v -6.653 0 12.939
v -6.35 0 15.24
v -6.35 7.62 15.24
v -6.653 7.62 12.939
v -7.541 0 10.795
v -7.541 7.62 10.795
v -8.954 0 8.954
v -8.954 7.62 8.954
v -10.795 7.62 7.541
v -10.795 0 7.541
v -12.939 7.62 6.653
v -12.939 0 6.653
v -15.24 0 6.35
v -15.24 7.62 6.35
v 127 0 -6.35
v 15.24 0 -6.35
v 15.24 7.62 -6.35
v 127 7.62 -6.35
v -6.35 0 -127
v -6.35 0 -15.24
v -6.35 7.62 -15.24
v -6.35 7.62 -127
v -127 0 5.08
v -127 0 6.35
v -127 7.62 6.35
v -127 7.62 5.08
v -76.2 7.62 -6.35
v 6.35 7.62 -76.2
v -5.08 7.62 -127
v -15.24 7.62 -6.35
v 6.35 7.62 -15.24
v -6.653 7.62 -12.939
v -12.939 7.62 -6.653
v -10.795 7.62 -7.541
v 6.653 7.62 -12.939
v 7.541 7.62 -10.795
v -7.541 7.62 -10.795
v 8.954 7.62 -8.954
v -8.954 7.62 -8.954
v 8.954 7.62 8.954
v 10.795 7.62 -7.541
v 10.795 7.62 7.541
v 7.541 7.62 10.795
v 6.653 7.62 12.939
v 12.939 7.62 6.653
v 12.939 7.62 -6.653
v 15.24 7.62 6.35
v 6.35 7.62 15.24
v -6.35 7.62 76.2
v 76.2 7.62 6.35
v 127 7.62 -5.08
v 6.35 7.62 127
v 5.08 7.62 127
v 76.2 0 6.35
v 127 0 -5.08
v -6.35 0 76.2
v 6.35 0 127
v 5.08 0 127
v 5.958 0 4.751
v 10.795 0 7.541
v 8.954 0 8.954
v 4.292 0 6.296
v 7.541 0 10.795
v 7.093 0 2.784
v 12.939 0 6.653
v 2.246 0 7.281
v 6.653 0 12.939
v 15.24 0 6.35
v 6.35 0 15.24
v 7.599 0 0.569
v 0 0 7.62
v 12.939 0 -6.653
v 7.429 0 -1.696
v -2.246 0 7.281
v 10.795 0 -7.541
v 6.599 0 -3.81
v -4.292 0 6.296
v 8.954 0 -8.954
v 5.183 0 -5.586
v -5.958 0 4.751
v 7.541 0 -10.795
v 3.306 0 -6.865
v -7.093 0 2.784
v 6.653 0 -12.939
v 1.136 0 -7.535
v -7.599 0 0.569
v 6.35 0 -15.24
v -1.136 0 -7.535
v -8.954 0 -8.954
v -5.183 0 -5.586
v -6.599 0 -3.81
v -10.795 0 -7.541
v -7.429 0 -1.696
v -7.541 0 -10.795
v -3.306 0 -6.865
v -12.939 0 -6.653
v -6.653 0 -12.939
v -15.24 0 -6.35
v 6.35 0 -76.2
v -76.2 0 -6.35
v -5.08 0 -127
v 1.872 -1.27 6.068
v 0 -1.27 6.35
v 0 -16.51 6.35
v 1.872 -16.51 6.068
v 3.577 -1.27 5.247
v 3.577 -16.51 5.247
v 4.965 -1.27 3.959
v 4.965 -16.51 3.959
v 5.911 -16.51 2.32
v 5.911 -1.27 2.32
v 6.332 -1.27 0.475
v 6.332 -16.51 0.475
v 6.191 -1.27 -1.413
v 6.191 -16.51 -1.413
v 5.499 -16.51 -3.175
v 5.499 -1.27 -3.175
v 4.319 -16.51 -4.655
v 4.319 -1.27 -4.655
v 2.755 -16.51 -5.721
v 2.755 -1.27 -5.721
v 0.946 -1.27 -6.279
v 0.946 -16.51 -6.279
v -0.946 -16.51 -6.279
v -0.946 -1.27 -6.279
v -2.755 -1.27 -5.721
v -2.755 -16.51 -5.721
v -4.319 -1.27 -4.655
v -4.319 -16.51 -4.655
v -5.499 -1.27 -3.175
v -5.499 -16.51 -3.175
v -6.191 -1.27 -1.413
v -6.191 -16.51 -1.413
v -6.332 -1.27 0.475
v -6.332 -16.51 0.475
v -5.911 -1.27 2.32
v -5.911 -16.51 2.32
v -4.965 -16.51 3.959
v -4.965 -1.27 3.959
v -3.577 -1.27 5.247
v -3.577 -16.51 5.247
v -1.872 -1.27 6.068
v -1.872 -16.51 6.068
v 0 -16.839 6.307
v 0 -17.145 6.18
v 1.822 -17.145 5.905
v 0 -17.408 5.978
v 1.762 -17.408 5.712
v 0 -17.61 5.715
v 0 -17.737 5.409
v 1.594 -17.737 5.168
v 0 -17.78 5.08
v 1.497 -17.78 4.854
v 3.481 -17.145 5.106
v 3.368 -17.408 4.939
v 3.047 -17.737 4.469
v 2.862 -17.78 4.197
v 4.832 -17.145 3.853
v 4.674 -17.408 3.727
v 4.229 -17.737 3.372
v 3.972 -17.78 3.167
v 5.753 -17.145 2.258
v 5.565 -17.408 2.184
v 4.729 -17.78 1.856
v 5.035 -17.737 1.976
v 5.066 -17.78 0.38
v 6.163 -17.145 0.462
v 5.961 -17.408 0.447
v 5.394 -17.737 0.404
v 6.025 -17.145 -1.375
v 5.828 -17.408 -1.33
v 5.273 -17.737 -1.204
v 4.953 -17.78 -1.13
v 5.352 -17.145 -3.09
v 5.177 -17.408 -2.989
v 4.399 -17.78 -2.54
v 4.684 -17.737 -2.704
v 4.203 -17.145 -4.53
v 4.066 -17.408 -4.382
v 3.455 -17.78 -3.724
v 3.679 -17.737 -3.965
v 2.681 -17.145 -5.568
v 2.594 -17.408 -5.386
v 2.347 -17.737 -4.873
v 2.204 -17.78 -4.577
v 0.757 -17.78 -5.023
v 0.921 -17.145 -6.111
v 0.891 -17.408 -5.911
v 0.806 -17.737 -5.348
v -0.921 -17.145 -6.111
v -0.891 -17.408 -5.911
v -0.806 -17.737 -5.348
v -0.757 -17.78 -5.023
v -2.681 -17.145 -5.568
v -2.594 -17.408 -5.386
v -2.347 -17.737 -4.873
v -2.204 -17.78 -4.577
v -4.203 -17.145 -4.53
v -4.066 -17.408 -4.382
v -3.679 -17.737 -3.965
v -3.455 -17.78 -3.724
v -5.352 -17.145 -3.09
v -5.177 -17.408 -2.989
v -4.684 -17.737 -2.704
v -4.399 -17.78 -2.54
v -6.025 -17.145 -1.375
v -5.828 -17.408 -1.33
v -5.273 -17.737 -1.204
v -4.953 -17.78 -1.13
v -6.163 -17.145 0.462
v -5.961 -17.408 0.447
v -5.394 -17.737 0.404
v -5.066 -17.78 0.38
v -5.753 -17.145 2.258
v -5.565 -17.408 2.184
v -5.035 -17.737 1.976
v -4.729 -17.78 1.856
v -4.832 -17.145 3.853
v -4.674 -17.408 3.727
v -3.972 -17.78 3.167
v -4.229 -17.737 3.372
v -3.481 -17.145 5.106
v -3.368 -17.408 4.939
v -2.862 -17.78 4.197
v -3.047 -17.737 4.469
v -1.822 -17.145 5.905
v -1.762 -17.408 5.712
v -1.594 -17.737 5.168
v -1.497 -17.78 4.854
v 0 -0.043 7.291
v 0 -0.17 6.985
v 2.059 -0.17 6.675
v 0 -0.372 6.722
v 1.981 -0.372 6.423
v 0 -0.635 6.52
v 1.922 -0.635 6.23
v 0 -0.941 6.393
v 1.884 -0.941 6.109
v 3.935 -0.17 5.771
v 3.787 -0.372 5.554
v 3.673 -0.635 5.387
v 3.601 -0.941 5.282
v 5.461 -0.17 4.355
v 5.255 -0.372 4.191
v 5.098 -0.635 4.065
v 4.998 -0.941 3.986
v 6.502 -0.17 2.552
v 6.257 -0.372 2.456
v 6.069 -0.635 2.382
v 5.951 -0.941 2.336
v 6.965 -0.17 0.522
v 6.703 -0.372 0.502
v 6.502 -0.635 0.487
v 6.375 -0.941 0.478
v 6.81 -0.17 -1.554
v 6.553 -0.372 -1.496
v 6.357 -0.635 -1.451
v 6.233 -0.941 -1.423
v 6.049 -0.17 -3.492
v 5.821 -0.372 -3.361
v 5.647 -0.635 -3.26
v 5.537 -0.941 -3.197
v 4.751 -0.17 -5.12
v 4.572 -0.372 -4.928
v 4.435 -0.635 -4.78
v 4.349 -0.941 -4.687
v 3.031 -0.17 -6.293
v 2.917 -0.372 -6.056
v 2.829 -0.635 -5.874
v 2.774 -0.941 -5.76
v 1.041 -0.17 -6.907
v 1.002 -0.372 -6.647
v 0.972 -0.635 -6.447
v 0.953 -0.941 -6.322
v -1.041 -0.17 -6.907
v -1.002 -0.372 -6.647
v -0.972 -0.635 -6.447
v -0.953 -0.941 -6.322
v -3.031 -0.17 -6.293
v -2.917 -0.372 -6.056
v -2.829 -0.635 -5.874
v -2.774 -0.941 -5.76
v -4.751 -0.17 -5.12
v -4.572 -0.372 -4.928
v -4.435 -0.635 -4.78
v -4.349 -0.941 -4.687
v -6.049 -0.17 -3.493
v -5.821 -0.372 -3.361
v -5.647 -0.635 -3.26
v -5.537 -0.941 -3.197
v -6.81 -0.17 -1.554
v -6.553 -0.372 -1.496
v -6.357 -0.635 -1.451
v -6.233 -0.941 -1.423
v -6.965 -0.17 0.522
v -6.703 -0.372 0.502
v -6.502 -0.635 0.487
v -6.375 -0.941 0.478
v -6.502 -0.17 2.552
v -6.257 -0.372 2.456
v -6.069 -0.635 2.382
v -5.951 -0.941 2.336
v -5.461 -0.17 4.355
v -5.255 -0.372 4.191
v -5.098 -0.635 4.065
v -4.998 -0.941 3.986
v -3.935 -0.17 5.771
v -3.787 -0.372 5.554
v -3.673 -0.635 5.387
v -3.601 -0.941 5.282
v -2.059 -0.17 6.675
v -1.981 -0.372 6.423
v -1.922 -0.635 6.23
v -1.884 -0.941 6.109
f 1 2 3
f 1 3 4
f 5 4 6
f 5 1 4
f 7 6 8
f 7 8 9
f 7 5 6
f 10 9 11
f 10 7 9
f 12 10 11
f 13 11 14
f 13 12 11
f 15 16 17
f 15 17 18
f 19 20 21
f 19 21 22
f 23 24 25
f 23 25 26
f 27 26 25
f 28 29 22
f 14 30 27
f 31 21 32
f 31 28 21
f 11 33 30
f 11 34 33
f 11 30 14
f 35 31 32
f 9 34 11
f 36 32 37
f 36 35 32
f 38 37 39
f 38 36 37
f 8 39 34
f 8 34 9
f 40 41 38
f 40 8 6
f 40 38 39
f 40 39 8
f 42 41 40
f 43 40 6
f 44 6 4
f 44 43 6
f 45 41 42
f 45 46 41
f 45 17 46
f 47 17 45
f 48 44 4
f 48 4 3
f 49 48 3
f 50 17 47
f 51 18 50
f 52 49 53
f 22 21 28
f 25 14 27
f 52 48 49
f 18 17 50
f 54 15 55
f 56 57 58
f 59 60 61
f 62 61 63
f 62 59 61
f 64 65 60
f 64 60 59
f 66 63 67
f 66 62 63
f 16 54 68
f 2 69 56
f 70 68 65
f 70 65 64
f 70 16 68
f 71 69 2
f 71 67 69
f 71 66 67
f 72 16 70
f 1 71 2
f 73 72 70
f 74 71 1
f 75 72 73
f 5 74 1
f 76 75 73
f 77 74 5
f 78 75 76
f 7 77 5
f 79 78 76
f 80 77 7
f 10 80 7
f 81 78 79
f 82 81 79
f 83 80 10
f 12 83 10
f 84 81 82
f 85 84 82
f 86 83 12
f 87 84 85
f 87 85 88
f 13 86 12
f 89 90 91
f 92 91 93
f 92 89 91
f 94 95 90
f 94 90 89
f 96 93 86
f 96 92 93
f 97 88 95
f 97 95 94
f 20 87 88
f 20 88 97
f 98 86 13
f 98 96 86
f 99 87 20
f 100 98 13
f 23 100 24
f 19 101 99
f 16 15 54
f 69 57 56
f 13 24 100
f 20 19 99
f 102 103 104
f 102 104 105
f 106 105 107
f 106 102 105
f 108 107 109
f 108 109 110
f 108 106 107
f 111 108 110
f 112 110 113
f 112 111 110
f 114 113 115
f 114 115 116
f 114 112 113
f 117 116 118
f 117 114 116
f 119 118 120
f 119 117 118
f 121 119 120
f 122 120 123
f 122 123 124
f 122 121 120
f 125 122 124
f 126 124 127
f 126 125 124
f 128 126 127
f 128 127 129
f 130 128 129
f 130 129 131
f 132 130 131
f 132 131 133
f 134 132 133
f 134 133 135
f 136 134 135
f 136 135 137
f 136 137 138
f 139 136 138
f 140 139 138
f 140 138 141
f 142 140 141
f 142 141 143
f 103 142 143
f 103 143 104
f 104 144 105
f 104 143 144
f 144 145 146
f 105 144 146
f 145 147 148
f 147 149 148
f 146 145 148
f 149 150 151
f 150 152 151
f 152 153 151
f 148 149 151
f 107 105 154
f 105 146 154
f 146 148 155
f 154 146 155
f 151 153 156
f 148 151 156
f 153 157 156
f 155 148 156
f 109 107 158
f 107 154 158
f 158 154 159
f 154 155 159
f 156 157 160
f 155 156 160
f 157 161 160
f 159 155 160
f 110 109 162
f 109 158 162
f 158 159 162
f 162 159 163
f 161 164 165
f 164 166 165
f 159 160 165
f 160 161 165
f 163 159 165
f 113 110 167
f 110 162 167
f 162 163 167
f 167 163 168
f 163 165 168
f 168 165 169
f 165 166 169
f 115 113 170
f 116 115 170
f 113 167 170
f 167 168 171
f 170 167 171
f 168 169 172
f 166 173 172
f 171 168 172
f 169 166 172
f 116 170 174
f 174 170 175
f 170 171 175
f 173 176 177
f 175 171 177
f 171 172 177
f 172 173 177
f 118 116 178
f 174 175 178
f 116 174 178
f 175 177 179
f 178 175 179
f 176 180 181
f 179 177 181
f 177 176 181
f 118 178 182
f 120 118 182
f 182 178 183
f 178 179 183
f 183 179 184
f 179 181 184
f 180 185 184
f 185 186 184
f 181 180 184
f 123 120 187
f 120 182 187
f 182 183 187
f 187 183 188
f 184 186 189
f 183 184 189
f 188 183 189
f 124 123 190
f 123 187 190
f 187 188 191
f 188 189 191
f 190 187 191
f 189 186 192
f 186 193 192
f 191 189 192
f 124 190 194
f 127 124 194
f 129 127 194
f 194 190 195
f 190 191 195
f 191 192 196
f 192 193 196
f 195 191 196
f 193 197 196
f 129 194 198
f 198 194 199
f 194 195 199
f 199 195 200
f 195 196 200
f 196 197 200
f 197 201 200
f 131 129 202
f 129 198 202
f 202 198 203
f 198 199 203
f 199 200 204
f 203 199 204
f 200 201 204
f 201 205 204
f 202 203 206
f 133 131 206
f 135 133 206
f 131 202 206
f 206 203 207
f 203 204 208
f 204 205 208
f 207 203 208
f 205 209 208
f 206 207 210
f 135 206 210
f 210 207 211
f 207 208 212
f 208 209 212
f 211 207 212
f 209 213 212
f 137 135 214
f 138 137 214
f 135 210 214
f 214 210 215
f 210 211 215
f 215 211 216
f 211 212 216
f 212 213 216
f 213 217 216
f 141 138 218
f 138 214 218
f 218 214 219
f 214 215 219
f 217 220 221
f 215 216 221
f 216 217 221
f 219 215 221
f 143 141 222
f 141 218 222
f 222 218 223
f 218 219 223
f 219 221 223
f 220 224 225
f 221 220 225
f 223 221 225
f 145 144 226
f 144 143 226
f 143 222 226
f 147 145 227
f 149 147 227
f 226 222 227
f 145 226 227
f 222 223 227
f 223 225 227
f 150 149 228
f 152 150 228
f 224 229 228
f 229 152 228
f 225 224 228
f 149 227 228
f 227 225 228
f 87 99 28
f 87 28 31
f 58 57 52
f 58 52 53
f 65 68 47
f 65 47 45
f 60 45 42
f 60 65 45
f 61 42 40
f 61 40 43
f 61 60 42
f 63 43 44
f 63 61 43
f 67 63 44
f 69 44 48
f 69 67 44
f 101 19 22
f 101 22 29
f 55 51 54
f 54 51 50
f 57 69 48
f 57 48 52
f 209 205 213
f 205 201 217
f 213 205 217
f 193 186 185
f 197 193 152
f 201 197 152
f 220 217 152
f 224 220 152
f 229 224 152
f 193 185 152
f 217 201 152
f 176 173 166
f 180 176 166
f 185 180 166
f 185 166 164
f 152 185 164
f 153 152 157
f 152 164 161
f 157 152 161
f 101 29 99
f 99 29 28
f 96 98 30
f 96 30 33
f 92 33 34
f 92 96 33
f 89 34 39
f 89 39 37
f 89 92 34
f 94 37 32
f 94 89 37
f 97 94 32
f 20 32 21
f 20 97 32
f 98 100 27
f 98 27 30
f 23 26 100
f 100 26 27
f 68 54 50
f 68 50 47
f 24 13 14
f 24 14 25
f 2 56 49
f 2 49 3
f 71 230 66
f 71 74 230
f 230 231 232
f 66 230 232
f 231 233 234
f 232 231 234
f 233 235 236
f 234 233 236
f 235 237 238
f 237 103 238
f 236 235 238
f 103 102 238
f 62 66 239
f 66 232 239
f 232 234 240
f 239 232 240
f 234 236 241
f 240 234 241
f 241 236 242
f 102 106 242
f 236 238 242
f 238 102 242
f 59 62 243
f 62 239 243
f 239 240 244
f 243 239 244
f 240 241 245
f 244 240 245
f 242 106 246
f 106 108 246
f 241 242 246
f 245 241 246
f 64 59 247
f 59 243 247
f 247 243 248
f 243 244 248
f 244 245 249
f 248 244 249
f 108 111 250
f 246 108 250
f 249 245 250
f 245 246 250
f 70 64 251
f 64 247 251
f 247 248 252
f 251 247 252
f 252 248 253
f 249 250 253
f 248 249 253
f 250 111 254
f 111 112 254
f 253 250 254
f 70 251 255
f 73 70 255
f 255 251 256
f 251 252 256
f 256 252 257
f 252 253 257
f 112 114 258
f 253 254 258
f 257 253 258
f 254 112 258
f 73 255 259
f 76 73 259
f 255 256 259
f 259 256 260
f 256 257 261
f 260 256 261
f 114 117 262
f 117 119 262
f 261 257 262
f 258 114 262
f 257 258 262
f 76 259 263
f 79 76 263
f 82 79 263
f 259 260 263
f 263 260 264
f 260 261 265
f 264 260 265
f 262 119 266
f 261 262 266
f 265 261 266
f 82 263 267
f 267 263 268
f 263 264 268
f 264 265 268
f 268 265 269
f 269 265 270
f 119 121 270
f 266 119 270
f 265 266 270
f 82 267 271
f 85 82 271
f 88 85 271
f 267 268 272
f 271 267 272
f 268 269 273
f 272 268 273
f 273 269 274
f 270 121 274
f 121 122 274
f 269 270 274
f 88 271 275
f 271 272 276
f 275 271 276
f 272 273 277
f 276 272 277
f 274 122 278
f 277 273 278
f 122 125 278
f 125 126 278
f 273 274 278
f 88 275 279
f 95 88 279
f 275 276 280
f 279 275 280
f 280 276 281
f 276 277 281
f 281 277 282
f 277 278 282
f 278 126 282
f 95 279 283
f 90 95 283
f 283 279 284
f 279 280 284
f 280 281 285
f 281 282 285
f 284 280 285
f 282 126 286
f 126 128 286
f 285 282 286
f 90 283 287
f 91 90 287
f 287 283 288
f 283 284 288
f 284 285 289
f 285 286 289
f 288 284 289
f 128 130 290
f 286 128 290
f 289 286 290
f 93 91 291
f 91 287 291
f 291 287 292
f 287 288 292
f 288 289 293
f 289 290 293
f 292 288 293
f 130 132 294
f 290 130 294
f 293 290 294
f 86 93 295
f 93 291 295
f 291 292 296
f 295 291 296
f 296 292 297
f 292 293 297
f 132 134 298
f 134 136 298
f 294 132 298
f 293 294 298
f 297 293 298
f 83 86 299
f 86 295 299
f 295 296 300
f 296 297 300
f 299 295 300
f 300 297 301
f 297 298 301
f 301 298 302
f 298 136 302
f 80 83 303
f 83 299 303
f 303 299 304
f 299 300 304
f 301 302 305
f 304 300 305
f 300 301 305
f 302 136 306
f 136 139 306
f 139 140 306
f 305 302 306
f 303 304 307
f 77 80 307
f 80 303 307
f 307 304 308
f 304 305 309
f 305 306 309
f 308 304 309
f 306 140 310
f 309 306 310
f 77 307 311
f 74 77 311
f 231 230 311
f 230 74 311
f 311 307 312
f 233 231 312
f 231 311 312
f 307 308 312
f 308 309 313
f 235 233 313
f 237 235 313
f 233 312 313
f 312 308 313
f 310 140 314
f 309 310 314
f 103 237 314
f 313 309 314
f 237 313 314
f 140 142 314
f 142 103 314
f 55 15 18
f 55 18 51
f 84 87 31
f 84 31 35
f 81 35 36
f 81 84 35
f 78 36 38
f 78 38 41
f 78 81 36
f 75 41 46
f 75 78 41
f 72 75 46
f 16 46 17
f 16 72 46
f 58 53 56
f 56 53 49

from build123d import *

# Parameters (mm, degrees)
BOSS_EXTRUDE1_DEPTH = 7.62
CUT_EXTRUDE1_DEPTH  = 180.766694357
SKETCH3_R           = 6.35
BOSS_EXTRUDE2_DEPTH = 25.4
FILLET1_R           = 1.27
FILLET2_R           = 1.27


with BuildPart() as part:
    # Sketch1 → Boss-Extrude1 (new body)
    with BuildSketch(Plane(origin=(0, 0, 0), x_dir=(1, 0, 0), z_dir=(0, 1, 0))):
        with BuildLine():
            Line((15.24, 6.35), (127, 6.35))
            Line((127, 6.35), (127, -6.35))
            Line((127, -6.35), (15.24, -6.35))
            ThreePointArc((15.24, -6.35), (8.953820715, -8.953820715), (6.35, -15.24))
            Line((6.35, -15.24), (6.35, -127))
            Line((6.35, -127), (-6.35, -127))
            Line((-6.35, -127), (-6.35, -15.24))
            ThreePointArc((-6.35, -15.24), (-8.953820715, -8.953820715), (-15.24, -6.35))
            Line((-15.24, -6.35), (-127, -6.35))
            Line((-127, -6.35), (-127, 6.35))
            Line((-127, 6.35), (-15.24, 6.35))
            ThreePointArc((-15.24, 6.35), (-8.953820715, 8.953820715), (-6.35, 15.24))
            Line((-6.35, 15.24), (-6.35, 127))
            Line((-6.35, 127), (6.35, 127))
            Line((6.35, 127), (6.35, 15.24))
            ThreePointArc((6.35, 15.24), (8.953820715, 8.953820715), (15.24, 6.35))
        make_face()
    extrude(amount=BOSS_EXTRUDE1_DEPTH)

    # Sketch2 → Cut-Extrude1 (cut, through all)
    with BuildSketch(Plane(origin=(0, 7.62, 0), x_dir=(1, 0, 0), z_dir=(0, 1, 0))):
        Polygon((127, 5.08), (76.2, -6.35), (127, -6.35), align=None)
        Polygon((-5.08, 127), (6.35, 76.2), (6.35, 127), align=None)
        Polygon((5.08, -127), (-6.35, -76.2), (-6.35, -127), align=None)
        Polygon((-127, -5.08), (-76.2, 6.35), (-127, 6.35), align=None)
    extrude(amount=-CUT_EXTRUDE1_DEPTH, mode=Mode.SUBTRACT)

    # Sketch3 → Boss-Extrude2 (add)
    with BuildSketch(Plane(origin=(0, 7.62, 0), x_dir=(1, 0, 0), z_dir=(0, 1, 0))):
        with Locations(Location((0, 0, 0), (0, 0, 270))):
            Circle(SKETCH3_R)
    extrude(amount=-BOSS_EXTRUDE2_DEPTH)

    # Fillet1
    fillet1_edges = [part.edges().sort_by_distance(p)[0] for p in [
        (0, 0, -6.35),
    ]]
    fillet(fillet1_edges, radius=FILLET1_R)

    # Fillet2
    fillet2_edges = [part.edges().sort_by_distance(p)[0] for p in [
        (0, -17.78, -6.35),
    ]]
    fillet(fillet2_edges, radius=FILLET2_R)


solid = part.part
